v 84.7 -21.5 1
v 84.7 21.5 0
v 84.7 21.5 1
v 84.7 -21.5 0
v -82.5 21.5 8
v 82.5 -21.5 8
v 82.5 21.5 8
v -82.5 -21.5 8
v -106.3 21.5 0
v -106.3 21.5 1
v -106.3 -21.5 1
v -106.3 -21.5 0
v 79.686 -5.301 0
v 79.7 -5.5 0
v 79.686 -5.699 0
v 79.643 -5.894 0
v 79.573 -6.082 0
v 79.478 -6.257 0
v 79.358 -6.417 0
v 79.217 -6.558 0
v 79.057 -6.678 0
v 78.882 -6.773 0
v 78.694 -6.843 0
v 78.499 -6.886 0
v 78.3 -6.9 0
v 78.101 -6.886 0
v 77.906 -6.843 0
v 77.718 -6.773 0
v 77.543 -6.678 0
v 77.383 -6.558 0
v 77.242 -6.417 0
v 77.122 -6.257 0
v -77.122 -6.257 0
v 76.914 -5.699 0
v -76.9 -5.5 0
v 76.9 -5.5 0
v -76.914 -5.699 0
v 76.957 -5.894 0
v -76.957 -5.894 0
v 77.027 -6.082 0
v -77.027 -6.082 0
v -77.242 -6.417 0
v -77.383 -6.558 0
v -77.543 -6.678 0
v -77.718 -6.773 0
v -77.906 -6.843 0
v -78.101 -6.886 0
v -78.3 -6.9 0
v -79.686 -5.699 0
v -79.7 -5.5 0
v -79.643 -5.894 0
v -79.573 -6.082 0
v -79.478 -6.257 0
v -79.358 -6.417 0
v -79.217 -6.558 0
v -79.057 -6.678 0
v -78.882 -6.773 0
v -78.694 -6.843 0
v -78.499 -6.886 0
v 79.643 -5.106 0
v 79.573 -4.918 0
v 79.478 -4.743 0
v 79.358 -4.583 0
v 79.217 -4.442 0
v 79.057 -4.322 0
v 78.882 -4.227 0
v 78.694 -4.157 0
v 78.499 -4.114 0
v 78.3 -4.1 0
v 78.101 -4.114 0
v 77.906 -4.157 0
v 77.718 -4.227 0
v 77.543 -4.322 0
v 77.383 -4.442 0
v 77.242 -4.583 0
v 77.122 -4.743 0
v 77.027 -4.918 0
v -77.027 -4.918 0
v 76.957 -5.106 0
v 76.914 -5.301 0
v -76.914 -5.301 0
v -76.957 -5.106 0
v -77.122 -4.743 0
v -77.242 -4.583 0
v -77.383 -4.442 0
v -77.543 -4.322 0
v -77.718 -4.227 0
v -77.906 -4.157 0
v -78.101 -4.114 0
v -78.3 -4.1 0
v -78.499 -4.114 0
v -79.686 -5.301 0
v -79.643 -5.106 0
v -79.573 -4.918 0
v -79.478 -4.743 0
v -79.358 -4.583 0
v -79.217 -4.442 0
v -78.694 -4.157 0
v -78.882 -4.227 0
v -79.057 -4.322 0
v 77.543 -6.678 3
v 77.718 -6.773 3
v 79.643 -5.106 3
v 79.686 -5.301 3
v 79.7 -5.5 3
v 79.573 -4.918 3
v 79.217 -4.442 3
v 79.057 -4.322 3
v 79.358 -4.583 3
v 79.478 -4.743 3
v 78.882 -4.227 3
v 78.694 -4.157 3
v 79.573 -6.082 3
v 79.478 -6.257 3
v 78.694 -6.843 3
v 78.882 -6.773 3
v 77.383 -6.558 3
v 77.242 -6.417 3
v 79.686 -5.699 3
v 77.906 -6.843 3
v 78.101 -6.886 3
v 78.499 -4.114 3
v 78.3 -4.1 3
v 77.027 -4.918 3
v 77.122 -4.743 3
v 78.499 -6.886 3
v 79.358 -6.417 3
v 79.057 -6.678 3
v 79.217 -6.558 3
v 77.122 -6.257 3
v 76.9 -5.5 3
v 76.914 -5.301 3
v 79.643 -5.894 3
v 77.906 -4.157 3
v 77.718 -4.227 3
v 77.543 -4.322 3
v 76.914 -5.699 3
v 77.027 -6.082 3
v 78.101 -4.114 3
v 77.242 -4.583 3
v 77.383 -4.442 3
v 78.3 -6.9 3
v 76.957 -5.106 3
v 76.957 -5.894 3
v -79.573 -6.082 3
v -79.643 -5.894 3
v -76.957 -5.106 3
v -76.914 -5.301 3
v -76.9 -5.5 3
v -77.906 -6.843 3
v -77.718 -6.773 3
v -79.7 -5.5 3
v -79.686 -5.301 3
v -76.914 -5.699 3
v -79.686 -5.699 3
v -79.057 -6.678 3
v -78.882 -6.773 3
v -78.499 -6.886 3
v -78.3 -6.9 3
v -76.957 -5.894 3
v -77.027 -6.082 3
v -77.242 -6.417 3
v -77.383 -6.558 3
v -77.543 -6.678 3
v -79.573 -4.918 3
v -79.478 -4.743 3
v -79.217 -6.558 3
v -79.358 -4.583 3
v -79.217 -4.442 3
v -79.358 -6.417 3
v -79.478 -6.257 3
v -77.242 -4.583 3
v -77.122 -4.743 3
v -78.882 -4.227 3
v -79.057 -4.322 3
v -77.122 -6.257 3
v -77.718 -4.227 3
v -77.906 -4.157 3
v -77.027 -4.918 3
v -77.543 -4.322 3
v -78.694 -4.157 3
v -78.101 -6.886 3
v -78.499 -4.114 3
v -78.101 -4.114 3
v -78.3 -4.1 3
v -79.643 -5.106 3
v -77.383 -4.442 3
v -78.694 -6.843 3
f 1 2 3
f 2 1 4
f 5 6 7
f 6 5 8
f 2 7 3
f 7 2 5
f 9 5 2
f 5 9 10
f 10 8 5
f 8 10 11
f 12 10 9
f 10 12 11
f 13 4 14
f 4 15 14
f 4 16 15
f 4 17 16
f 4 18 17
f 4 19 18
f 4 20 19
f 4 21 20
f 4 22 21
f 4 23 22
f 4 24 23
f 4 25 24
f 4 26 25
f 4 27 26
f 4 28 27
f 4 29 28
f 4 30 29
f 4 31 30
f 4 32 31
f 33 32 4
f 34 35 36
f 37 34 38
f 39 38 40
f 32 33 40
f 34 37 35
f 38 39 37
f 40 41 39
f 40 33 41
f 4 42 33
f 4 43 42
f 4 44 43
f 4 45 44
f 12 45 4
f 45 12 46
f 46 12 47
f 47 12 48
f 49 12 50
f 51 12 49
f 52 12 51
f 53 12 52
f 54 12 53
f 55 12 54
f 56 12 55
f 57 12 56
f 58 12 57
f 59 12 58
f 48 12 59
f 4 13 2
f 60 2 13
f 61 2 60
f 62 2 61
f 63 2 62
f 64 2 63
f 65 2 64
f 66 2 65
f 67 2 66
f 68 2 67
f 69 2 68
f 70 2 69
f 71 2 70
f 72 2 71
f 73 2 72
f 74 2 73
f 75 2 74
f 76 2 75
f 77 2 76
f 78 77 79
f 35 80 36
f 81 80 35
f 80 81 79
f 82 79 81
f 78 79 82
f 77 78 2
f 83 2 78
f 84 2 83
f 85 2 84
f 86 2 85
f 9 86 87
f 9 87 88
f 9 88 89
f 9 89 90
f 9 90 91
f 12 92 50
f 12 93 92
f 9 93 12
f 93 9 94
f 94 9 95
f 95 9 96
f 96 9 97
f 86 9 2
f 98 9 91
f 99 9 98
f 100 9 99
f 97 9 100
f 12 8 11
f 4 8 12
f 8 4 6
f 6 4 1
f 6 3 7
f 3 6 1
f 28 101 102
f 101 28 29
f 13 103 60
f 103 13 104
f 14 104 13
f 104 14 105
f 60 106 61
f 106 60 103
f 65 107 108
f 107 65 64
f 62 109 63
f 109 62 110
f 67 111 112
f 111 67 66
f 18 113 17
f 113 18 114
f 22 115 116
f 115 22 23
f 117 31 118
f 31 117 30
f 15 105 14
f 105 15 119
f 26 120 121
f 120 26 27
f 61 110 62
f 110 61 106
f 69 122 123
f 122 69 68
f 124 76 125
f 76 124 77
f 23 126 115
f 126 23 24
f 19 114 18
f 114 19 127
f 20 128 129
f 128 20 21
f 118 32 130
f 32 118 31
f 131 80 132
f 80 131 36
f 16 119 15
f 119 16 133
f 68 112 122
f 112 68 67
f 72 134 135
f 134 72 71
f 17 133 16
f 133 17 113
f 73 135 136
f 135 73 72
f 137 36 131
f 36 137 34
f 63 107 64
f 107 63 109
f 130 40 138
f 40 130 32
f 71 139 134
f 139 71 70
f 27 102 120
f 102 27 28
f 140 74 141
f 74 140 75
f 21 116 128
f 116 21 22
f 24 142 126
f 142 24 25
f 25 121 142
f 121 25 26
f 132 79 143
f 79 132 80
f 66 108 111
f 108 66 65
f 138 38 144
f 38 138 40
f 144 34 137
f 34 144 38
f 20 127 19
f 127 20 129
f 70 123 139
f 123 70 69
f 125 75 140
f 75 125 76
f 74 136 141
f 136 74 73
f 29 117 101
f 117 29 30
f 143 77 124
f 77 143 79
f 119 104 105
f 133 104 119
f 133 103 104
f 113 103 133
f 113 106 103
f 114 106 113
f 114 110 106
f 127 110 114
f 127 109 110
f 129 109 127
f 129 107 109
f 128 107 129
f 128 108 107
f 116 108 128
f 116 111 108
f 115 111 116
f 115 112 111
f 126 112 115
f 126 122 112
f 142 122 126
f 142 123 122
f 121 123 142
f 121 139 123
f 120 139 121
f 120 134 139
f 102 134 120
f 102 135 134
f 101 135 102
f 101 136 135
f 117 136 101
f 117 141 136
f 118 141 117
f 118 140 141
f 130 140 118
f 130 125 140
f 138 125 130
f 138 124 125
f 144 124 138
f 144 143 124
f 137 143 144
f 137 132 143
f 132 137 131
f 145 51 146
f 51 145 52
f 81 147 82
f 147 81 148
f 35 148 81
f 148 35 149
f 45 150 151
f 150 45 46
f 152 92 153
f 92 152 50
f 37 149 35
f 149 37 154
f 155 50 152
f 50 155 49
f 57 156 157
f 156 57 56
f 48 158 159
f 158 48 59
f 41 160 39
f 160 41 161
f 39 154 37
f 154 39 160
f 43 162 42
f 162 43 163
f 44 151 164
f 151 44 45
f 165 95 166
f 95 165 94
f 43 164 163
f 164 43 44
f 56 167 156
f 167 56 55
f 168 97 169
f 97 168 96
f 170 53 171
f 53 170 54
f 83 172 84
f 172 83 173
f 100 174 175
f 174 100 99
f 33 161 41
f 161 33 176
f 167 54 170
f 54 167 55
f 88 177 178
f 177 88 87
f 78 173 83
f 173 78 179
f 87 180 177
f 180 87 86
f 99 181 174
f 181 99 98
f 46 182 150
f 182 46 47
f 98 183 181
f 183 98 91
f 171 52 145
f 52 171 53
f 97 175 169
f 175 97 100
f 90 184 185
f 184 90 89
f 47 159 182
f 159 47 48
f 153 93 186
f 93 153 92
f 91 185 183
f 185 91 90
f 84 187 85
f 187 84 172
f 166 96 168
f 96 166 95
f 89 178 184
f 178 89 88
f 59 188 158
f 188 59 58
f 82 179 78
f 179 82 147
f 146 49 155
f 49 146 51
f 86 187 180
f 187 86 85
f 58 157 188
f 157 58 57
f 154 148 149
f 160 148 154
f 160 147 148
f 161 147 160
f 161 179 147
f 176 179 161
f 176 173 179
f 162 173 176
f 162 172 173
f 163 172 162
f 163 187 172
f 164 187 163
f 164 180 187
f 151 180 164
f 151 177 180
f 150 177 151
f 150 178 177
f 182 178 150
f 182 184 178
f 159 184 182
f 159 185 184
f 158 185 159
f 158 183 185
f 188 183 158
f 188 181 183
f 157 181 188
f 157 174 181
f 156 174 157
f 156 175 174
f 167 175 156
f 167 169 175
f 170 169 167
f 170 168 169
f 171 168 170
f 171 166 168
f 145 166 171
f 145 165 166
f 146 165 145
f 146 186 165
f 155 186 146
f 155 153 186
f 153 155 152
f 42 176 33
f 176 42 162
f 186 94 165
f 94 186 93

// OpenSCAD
$fa=5;$fs=.2;
d=[6.4,156.6,28];
a=16;

size=[191,43,1];
foot=[165,43];
t=8;

difference(){
	hull(){
		translate([-d[1]/2-d[2],-size[1]/2,0])cube(size);
		translate([0,0,t])linear_extrude(1e-9)square(foot,center=true);
	}
	translate([ d[1]/2,-size[1]/2+a,0])cylinder(d=3-.2,h=3);
	translate([-d[1]/2,-size[1]/2+a,0])cylinder(d=3-.2,h=3);
}
